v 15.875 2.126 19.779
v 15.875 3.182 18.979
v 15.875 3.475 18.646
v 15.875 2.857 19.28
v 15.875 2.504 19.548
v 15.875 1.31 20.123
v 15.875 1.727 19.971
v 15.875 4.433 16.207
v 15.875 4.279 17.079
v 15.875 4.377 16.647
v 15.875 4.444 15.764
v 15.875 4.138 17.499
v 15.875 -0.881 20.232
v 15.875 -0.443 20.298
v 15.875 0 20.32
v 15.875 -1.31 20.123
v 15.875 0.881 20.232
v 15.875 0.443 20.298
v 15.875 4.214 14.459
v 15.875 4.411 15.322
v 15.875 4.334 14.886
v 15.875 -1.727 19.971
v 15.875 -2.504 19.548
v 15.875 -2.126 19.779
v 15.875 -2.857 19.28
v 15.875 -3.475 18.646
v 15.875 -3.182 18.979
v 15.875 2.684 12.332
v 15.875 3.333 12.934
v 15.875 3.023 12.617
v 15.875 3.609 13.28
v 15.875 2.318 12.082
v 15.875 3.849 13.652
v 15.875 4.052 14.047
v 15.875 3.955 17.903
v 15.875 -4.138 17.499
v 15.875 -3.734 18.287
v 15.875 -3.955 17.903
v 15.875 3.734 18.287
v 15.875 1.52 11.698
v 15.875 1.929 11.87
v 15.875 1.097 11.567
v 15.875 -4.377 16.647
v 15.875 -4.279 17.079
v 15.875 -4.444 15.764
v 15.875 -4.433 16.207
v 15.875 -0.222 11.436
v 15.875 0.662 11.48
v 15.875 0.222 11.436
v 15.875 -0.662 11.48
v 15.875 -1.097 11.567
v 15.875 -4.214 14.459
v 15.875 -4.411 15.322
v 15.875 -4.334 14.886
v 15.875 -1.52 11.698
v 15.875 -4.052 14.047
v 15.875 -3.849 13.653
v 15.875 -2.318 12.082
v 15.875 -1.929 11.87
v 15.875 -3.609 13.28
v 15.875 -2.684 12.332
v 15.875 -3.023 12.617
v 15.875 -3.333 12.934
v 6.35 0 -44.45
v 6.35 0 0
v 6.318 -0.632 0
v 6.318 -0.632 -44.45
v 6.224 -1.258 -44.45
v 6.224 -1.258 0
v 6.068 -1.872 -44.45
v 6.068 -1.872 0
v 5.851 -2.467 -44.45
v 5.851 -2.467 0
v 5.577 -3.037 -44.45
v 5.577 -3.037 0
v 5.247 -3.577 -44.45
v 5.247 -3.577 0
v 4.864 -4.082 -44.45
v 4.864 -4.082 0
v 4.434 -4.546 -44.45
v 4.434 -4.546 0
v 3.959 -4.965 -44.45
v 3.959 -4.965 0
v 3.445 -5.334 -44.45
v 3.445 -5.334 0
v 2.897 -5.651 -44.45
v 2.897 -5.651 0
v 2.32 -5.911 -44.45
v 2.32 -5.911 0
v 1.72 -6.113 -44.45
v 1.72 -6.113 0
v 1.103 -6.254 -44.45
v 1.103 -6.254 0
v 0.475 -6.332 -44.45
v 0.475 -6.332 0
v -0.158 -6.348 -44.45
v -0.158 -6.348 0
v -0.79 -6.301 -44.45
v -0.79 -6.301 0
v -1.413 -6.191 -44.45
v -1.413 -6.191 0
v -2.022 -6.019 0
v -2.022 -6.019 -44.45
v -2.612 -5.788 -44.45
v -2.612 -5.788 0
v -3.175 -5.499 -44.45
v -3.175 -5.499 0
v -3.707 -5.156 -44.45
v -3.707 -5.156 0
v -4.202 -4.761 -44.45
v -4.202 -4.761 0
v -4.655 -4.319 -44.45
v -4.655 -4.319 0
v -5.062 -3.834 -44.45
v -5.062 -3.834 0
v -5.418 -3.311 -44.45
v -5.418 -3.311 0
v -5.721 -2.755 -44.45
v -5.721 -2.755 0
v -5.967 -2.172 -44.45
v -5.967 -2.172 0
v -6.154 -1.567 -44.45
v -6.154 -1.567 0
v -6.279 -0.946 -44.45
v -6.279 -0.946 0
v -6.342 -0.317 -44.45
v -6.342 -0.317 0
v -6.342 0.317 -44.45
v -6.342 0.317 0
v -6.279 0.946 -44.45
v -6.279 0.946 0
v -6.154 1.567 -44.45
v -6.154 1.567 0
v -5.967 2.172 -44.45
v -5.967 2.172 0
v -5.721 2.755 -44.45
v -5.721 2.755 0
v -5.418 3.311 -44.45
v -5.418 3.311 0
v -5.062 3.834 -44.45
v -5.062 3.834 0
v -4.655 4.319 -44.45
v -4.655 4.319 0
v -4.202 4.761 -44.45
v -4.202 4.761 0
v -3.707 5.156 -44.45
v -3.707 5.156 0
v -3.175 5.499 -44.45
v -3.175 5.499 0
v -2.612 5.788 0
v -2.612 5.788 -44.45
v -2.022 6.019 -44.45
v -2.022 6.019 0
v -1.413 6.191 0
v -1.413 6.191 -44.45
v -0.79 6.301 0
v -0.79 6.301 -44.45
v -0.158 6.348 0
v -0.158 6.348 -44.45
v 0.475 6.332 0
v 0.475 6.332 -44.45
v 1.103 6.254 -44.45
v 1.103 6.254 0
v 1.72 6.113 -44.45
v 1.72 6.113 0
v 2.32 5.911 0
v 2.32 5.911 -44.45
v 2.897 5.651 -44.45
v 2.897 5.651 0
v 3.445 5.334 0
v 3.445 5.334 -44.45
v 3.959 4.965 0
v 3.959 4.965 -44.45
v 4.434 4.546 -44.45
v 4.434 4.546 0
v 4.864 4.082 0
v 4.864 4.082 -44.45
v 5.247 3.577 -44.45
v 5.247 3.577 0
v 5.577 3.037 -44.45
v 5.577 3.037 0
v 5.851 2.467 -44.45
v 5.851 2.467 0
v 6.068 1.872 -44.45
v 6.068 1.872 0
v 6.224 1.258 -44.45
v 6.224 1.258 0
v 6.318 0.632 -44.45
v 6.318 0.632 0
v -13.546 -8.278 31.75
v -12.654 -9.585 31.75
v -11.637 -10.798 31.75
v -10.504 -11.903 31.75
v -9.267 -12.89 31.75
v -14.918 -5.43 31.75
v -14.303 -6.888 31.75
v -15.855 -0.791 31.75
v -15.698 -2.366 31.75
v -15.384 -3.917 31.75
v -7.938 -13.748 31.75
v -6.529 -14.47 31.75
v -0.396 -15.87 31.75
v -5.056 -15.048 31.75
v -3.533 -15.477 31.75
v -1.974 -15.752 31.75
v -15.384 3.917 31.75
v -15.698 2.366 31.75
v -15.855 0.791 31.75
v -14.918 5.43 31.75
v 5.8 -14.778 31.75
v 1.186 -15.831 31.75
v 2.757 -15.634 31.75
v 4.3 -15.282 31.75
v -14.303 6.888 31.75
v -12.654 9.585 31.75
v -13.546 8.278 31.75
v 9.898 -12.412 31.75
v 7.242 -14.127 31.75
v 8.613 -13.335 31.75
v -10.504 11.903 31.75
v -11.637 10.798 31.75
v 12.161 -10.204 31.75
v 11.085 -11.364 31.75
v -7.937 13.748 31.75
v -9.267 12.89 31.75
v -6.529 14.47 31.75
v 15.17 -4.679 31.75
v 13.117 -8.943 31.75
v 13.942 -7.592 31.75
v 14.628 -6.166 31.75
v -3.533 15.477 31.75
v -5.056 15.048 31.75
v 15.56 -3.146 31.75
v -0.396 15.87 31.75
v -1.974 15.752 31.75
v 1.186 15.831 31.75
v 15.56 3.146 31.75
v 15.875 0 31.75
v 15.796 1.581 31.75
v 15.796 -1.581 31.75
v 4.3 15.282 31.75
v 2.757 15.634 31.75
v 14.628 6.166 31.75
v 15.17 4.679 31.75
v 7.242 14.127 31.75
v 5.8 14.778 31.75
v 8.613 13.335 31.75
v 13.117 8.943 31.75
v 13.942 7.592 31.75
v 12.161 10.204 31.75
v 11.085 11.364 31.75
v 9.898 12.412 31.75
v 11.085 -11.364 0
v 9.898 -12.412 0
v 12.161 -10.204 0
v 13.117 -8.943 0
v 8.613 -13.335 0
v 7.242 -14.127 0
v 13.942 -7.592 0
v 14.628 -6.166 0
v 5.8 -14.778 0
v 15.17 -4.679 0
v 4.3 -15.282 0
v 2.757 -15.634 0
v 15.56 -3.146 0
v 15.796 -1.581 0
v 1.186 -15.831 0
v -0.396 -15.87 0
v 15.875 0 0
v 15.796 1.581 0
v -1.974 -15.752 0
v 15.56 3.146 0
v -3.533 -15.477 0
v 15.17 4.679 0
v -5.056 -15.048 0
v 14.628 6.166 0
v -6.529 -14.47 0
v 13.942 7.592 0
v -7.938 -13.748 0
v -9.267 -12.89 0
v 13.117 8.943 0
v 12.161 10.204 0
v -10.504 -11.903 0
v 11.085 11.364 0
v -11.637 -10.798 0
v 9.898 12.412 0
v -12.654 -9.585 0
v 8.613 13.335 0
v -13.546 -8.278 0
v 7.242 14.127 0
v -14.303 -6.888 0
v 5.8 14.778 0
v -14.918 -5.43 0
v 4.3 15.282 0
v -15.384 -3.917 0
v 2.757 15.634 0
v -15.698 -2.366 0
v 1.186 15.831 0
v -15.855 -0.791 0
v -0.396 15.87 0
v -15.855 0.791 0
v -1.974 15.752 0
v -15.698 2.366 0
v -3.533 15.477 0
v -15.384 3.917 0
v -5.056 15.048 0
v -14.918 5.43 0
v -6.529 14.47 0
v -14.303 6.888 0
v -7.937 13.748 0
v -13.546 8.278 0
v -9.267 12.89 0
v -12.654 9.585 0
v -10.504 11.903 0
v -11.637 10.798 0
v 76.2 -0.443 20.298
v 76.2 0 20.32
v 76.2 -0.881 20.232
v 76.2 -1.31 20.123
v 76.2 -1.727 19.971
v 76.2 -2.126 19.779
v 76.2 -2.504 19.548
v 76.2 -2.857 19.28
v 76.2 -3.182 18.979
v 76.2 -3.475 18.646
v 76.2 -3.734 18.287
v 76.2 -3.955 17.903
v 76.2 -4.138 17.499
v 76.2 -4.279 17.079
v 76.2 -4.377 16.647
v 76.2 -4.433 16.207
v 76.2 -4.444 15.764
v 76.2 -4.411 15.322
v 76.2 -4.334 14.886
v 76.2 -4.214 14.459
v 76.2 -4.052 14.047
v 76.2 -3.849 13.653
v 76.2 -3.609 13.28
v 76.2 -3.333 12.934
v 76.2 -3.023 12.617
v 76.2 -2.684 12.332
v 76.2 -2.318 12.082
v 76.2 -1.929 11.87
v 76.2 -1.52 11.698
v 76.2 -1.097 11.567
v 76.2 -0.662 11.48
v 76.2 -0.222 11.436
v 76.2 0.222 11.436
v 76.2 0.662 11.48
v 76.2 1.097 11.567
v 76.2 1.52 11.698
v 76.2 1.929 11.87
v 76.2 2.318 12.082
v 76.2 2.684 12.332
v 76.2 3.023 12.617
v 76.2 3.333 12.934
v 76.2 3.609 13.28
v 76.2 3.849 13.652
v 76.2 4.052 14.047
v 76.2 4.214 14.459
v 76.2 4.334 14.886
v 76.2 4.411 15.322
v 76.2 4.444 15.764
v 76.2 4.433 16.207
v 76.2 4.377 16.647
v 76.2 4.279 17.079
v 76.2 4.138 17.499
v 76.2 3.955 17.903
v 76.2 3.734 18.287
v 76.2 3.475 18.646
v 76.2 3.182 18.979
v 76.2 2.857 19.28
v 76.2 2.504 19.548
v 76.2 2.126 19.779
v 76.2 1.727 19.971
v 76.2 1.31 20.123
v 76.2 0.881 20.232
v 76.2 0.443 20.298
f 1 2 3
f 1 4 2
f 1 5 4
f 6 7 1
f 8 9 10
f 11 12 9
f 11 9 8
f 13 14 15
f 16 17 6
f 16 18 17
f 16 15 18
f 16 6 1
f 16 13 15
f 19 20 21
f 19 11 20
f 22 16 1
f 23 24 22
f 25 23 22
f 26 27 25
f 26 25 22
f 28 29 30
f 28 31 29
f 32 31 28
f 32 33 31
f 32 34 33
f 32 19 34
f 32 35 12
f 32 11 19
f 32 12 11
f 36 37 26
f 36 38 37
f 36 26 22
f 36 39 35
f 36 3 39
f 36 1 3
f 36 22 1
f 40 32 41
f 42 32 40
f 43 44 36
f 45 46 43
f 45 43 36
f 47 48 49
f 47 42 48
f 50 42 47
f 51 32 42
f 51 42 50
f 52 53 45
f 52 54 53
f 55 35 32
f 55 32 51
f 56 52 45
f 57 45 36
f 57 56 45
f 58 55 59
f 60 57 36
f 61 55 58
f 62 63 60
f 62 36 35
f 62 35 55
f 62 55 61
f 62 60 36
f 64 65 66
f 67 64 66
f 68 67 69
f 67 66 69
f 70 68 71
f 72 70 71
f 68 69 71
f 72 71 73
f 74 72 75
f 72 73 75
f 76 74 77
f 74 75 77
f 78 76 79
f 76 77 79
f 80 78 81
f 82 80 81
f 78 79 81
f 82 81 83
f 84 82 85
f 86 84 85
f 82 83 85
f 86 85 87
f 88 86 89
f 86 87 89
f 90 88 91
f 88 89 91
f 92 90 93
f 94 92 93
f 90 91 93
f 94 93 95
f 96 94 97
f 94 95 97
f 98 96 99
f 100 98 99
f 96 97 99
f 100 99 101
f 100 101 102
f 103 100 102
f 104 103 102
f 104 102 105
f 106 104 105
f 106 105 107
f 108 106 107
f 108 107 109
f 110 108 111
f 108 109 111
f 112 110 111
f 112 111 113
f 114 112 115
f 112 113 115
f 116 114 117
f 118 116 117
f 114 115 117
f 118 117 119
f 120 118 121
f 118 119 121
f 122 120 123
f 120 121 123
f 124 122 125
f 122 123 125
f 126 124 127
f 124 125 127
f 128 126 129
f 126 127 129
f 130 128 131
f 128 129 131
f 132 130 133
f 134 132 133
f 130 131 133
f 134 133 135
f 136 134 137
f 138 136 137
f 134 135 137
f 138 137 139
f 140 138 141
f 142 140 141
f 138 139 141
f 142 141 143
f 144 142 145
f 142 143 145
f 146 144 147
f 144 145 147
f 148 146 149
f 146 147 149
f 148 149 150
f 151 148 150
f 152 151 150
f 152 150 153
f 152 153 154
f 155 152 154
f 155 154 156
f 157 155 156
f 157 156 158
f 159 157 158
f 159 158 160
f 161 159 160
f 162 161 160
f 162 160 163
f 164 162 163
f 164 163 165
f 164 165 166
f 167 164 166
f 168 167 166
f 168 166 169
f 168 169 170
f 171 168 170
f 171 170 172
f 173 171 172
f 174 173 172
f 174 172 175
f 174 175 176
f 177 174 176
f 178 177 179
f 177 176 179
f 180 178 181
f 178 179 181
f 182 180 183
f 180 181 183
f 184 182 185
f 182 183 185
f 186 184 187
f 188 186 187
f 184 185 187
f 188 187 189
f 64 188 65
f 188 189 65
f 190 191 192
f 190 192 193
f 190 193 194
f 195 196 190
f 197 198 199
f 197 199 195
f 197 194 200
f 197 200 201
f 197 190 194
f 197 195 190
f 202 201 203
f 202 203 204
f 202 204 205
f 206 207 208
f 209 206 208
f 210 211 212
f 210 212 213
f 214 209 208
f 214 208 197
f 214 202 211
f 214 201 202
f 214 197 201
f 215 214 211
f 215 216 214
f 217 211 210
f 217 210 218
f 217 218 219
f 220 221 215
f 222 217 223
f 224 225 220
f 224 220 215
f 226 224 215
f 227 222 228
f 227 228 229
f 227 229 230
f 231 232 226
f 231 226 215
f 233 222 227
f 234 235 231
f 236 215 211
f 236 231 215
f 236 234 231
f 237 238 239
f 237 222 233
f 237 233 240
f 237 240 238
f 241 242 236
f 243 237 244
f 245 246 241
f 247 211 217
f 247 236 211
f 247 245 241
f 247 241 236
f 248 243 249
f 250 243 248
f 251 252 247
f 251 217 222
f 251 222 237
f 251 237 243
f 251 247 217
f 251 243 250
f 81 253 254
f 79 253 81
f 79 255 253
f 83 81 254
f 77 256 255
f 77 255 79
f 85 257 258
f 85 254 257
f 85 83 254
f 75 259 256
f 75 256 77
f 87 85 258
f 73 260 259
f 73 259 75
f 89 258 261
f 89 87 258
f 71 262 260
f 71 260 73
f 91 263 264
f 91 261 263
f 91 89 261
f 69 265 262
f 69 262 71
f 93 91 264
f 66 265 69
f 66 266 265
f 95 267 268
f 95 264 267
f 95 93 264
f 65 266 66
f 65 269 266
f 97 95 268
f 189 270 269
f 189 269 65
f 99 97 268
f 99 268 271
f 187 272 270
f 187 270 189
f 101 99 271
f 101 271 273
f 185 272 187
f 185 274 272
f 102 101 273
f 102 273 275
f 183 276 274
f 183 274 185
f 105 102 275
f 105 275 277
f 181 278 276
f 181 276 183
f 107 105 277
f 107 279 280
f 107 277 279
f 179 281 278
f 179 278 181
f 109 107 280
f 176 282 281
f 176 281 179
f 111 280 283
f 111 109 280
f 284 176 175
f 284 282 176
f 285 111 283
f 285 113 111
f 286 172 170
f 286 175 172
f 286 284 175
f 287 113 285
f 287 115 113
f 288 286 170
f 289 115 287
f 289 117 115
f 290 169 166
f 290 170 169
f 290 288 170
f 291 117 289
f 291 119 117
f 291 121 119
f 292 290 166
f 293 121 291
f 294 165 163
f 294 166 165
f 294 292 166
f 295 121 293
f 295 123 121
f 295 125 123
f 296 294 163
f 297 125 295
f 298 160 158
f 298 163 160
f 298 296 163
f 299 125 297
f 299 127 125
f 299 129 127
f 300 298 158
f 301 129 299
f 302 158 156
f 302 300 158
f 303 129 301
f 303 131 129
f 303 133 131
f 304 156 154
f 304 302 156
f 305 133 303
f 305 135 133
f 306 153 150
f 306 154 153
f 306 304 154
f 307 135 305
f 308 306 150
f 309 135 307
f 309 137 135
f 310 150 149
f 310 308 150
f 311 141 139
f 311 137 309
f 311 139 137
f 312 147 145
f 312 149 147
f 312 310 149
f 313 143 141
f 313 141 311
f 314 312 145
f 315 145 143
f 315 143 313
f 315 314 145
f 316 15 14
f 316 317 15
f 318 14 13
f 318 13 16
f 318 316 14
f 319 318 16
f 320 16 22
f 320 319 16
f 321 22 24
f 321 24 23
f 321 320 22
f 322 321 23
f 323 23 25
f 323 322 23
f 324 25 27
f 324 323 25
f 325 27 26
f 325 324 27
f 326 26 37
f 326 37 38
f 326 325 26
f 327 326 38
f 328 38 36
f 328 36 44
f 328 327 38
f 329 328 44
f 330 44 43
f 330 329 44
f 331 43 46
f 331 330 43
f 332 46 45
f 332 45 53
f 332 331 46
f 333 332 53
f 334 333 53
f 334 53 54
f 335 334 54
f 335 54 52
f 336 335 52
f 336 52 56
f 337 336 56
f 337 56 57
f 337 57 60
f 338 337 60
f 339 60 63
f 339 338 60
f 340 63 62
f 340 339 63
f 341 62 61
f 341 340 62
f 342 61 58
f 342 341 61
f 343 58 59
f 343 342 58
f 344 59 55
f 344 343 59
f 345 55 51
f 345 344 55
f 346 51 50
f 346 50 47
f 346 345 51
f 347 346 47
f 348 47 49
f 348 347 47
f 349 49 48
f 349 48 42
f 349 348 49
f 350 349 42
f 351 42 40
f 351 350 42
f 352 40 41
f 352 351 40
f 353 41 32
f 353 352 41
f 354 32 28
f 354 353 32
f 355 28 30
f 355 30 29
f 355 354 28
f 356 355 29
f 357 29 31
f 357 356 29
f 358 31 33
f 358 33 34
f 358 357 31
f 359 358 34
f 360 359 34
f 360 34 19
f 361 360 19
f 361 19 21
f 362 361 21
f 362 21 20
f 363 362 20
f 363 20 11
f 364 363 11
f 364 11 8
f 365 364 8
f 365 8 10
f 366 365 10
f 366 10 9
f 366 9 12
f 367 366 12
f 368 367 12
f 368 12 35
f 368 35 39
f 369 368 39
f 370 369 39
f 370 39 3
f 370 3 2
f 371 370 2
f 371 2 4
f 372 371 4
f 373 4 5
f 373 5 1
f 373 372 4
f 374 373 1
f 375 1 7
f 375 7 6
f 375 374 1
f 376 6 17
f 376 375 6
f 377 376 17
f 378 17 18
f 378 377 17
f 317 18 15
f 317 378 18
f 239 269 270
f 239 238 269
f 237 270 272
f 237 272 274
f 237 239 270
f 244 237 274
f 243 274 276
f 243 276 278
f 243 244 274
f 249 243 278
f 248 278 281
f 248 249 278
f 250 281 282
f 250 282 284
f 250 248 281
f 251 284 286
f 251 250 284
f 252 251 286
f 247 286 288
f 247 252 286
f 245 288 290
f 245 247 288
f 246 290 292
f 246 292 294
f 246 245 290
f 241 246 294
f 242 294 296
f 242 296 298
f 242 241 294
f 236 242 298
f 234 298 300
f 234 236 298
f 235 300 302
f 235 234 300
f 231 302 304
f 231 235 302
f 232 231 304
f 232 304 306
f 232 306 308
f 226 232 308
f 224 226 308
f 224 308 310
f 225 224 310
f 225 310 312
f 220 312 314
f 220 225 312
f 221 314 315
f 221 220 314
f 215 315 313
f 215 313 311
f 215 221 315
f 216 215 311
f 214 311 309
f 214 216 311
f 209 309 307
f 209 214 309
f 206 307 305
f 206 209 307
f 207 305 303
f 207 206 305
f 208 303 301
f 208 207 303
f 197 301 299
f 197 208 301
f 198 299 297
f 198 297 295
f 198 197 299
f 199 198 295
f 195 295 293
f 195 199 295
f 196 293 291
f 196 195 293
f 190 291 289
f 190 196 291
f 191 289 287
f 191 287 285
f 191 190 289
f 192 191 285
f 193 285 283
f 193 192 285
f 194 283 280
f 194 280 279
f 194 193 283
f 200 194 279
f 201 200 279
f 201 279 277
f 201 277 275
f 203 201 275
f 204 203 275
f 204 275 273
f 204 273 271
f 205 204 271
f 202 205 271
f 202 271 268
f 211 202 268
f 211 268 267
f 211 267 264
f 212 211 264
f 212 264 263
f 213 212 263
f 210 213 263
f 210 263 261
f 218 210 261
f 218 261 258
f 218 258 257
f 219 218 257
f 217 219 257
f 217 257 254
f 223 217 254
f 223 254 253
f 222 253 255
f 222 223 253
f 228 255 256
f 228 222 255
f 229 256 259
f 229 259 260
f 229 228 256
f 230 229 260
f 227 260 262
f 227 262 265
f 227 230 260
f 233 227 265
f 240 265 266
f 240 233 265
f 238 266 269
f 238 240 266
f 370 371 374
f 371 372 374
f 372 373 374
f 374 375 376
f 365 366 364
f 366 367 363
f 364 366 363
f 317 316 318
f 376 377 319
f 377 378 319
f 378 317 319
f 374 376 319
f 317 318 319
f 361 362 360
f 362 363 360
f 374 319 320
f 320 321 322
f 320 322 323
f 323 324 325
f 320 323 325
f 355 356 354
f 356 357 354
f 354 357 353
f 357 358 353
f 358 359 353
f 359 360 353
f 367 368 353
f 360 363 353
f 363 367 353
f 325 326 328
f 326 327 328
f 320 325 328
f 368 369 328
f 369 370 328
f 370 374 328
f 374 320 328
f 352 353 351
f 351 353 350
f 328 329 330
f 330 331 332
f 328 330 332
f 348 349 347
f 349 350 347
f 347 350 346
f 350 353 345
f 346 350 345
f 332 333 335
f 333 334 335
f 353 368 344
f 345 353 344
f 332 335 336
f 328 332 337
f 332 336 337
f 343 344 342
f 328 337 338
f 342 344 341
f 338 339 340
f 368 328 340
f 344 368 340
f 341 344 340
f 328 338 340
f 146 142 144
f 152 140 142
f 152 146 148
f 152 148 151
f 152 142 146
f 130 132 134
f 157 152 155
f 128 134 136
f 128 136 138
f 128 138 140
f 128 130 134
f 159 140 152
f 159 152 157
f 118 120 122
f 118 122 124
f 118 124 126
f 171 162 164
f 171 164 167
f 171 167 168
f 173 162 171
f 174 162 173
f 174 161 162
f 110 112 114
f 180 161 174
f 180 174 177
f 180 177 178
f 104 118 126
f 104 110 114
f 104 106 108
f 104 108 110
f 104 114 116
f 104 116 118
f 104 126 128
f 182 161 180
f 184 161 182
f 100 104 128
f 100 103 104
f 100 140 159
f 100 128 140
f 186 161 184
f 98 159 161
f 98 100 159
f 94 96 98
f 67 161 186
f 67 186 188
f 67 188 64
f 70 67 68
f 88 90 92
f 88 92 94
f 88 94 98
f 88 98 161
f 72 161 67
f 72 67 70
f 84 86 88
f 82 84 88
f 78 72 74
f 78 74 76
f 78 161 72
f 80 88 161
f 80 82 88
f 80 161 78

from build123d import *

# Parameters (mm, degrees)
F0_W     = 60.325
F0_H     = 4.445
F3_R     = 6.35
F4_DEPTH = 44.45


with BuildPart() as f1:
    # F0 (on Front) → F1 (revolve)
    with BuildSketch(Plane.XZ):
        Polygon((0, 31.75), (0, 0), (15.875, 0), (15.875, 15.875), (15.875, 20.32), (15.875, 31.75), align=None)
    revolve(axis=Axis((0, 0, 15.875), (0, 0, 1)))

    # F3 (on face) → F4 (join)
    with BuildSketch(Plane(origin=(0, 0, 0), x_dir=(1, 0, 0), z_dir=(0, 0, -1))):
        Circle(F3_R)
    extrude(amount=F4_DEPTH)


with BuildPart() as f2:
    # F0 (on Front) → F2 (revolve)
    with BuildSketch(Plane.XZ):
        with Locations((46.0375, 18.0975)):
            Rectangle(F0_W, F0_H)
    revolve(axis=Axis((46.0375, 0, 15.875), (1, 0, 0)))


solid = Compound([f1.part, f2.part])
